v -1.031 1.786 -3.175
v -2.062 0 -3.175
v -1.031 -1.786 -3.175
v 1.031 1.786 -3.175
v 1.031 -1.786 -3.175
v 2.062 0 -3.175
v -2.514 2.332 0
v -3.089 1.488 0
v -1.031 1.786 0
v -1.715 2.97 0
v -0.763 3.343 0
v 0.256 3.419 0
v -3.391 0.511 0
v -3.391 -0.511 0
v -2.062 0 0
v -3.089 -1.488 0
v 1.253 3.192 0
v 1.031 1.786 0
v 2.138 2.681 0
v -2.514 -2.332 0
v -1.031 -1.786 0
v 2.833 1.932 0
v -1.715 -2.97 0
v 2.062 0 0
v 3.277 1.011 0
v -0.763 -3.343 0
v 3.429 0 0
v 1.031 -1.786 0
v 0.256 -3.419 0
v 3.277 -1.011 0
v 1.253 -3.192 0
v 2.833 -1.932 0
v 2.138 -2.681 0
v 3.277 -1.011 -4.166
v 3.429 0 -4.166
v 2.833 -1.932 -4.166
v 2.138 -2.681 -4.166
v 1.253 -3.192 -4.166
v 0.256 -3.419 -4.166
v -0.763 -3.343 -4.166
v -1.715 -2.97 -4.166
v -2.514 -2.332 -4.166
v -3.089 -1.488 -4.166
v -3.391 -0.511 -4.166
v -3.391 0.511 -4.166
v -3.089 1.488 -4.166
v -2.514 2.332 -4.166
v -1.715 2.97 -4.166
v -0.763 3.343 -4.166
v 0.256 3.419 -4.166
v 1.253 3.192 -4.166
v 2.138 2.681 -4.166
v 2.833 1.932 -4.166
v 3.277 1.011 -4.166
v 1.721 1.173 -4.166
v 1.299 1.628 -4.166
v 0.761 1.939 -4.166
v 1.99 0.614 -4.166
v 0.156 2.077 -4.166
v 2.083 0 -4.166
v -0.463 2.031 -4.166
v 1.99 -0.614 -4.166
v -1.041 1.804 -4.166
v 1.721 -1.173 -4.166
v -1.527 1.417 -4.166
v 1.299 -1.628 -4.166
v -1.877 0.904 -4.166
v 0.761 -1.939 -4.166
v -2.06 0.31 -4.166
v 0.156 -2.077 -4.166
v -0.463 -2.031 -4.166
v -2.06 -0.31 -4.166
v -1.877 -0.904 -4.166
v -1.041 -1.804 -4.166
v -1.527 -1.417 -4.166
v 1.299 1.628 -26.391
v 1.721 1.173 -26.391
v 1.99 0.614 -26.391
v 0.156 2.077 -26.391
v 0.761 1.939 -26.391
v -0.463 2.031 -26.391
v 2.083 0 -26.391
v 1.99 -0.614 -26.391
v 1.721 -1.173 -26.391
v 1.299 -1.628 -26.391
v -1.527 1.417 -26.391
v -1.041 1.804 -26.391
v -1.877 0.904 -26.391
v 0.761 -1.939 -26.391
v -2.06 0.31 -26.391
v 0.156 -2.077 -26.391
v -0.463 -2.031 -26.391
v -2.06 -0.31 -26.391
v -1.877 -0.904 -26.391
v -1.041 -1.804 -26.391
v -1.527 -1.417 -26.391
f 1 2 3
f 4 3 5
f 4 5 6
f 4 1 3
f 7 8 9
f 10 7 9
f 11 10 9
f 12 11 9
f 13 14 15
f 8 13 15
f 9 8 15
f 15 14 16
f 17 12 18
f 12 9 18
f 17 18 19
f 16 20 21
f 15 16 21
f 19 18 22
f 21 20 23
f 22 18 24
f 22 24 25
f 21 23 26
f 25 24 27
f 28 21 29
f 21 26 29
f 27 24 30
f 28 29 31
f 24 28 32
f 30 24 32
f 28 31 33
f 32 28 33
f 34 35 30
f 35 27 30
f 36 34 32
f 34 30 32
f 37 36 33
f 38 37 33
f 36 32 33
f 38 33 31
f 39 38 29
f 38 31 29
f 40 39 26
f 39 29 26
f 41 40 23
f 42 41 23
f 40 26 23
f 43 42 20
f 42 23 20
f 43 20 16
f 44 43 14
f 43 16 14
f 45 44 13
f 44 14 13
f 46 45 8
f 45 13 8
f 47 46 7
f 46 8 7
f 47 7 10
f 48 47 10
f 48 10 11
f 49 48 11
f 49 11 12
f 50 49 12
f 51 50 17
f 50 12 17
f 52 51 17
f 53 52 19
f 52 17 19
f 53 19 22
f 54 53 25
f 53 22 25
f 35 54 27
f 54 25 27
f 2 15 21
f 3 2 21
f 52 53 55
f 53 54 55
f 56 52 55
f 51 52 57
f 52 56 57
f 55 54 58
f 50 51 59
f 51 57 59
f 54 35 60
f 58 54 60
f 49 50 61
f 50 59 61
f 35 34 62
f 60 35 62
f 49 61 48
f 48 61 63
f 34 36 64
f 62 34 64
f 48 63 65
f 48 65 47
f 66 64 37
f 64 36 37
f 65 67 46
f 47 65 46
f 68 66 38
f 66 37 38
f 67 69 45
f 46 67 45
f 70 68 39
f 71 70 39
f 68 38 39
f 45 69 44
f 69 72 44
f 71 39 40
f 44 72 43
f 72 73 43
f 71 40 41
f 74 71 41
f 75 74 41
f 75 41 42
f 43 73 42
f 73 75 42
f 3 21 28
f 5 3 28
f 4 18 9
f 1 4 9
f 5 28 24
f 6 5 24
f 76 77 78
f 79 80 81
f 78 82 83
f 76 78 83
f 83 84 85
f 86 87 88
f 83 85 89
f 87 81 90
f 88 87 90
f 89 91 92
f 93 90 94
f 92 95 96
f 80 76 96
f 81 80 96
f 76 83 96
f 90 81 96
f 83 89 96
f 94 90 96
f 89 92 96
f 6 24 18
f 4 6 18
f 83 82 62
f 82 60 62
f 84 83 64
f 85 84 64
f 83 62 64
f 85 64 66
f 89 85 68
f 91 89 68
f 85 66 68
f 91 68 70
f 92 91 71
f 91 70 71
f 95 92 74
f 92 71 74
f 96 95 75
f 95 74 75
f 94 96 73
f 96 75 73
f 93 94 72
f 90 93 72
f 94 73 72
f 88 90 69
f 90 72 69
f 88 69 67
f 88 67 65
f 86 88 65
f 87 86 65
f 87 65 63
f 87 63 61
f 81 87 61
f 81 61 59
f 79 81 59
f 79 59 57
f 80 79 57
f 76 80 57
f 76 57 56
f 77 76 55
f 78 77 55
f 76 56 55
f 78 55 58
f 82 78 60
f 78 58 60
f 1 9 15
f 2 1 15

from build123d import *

# Parameters (mm, degrees)
F_9_64_ALLEN_DEPTH = 3.175


with BuildPart() as part:
    # Sketch1 → Revolve1 (revolve)
    with BuildSketch(Plane(origin=(0, 0, 0), x_dir=(1, 0, 0), z_dir=(0, 1, 0))):
        Polygon((0, 0), (0, 26.3906), (2.0828, 26.3906), (2.0828, 4.1656), (3.429, 4.1656), (3.429, 0), align=None)
    revolve(axis=Axis((0, 0, 0), (0, 0, -1)))

    # Sketch2 → 9-64 allen (cut)
    with BuildSketch(Plane.XY):
        Polygon((2.062222993, 0), (1.031111496, 1.7859375), (-1.031111496, 1.7859375), (-2.062222993, 0), (-1.031111496, -1.7859375), (1.031111496, -1.7859375), align=None)
    extrude(amount=-F_9_64_ALLEN_DEPTH, mode=Mode.SUBTRACT)


solid = part.part
